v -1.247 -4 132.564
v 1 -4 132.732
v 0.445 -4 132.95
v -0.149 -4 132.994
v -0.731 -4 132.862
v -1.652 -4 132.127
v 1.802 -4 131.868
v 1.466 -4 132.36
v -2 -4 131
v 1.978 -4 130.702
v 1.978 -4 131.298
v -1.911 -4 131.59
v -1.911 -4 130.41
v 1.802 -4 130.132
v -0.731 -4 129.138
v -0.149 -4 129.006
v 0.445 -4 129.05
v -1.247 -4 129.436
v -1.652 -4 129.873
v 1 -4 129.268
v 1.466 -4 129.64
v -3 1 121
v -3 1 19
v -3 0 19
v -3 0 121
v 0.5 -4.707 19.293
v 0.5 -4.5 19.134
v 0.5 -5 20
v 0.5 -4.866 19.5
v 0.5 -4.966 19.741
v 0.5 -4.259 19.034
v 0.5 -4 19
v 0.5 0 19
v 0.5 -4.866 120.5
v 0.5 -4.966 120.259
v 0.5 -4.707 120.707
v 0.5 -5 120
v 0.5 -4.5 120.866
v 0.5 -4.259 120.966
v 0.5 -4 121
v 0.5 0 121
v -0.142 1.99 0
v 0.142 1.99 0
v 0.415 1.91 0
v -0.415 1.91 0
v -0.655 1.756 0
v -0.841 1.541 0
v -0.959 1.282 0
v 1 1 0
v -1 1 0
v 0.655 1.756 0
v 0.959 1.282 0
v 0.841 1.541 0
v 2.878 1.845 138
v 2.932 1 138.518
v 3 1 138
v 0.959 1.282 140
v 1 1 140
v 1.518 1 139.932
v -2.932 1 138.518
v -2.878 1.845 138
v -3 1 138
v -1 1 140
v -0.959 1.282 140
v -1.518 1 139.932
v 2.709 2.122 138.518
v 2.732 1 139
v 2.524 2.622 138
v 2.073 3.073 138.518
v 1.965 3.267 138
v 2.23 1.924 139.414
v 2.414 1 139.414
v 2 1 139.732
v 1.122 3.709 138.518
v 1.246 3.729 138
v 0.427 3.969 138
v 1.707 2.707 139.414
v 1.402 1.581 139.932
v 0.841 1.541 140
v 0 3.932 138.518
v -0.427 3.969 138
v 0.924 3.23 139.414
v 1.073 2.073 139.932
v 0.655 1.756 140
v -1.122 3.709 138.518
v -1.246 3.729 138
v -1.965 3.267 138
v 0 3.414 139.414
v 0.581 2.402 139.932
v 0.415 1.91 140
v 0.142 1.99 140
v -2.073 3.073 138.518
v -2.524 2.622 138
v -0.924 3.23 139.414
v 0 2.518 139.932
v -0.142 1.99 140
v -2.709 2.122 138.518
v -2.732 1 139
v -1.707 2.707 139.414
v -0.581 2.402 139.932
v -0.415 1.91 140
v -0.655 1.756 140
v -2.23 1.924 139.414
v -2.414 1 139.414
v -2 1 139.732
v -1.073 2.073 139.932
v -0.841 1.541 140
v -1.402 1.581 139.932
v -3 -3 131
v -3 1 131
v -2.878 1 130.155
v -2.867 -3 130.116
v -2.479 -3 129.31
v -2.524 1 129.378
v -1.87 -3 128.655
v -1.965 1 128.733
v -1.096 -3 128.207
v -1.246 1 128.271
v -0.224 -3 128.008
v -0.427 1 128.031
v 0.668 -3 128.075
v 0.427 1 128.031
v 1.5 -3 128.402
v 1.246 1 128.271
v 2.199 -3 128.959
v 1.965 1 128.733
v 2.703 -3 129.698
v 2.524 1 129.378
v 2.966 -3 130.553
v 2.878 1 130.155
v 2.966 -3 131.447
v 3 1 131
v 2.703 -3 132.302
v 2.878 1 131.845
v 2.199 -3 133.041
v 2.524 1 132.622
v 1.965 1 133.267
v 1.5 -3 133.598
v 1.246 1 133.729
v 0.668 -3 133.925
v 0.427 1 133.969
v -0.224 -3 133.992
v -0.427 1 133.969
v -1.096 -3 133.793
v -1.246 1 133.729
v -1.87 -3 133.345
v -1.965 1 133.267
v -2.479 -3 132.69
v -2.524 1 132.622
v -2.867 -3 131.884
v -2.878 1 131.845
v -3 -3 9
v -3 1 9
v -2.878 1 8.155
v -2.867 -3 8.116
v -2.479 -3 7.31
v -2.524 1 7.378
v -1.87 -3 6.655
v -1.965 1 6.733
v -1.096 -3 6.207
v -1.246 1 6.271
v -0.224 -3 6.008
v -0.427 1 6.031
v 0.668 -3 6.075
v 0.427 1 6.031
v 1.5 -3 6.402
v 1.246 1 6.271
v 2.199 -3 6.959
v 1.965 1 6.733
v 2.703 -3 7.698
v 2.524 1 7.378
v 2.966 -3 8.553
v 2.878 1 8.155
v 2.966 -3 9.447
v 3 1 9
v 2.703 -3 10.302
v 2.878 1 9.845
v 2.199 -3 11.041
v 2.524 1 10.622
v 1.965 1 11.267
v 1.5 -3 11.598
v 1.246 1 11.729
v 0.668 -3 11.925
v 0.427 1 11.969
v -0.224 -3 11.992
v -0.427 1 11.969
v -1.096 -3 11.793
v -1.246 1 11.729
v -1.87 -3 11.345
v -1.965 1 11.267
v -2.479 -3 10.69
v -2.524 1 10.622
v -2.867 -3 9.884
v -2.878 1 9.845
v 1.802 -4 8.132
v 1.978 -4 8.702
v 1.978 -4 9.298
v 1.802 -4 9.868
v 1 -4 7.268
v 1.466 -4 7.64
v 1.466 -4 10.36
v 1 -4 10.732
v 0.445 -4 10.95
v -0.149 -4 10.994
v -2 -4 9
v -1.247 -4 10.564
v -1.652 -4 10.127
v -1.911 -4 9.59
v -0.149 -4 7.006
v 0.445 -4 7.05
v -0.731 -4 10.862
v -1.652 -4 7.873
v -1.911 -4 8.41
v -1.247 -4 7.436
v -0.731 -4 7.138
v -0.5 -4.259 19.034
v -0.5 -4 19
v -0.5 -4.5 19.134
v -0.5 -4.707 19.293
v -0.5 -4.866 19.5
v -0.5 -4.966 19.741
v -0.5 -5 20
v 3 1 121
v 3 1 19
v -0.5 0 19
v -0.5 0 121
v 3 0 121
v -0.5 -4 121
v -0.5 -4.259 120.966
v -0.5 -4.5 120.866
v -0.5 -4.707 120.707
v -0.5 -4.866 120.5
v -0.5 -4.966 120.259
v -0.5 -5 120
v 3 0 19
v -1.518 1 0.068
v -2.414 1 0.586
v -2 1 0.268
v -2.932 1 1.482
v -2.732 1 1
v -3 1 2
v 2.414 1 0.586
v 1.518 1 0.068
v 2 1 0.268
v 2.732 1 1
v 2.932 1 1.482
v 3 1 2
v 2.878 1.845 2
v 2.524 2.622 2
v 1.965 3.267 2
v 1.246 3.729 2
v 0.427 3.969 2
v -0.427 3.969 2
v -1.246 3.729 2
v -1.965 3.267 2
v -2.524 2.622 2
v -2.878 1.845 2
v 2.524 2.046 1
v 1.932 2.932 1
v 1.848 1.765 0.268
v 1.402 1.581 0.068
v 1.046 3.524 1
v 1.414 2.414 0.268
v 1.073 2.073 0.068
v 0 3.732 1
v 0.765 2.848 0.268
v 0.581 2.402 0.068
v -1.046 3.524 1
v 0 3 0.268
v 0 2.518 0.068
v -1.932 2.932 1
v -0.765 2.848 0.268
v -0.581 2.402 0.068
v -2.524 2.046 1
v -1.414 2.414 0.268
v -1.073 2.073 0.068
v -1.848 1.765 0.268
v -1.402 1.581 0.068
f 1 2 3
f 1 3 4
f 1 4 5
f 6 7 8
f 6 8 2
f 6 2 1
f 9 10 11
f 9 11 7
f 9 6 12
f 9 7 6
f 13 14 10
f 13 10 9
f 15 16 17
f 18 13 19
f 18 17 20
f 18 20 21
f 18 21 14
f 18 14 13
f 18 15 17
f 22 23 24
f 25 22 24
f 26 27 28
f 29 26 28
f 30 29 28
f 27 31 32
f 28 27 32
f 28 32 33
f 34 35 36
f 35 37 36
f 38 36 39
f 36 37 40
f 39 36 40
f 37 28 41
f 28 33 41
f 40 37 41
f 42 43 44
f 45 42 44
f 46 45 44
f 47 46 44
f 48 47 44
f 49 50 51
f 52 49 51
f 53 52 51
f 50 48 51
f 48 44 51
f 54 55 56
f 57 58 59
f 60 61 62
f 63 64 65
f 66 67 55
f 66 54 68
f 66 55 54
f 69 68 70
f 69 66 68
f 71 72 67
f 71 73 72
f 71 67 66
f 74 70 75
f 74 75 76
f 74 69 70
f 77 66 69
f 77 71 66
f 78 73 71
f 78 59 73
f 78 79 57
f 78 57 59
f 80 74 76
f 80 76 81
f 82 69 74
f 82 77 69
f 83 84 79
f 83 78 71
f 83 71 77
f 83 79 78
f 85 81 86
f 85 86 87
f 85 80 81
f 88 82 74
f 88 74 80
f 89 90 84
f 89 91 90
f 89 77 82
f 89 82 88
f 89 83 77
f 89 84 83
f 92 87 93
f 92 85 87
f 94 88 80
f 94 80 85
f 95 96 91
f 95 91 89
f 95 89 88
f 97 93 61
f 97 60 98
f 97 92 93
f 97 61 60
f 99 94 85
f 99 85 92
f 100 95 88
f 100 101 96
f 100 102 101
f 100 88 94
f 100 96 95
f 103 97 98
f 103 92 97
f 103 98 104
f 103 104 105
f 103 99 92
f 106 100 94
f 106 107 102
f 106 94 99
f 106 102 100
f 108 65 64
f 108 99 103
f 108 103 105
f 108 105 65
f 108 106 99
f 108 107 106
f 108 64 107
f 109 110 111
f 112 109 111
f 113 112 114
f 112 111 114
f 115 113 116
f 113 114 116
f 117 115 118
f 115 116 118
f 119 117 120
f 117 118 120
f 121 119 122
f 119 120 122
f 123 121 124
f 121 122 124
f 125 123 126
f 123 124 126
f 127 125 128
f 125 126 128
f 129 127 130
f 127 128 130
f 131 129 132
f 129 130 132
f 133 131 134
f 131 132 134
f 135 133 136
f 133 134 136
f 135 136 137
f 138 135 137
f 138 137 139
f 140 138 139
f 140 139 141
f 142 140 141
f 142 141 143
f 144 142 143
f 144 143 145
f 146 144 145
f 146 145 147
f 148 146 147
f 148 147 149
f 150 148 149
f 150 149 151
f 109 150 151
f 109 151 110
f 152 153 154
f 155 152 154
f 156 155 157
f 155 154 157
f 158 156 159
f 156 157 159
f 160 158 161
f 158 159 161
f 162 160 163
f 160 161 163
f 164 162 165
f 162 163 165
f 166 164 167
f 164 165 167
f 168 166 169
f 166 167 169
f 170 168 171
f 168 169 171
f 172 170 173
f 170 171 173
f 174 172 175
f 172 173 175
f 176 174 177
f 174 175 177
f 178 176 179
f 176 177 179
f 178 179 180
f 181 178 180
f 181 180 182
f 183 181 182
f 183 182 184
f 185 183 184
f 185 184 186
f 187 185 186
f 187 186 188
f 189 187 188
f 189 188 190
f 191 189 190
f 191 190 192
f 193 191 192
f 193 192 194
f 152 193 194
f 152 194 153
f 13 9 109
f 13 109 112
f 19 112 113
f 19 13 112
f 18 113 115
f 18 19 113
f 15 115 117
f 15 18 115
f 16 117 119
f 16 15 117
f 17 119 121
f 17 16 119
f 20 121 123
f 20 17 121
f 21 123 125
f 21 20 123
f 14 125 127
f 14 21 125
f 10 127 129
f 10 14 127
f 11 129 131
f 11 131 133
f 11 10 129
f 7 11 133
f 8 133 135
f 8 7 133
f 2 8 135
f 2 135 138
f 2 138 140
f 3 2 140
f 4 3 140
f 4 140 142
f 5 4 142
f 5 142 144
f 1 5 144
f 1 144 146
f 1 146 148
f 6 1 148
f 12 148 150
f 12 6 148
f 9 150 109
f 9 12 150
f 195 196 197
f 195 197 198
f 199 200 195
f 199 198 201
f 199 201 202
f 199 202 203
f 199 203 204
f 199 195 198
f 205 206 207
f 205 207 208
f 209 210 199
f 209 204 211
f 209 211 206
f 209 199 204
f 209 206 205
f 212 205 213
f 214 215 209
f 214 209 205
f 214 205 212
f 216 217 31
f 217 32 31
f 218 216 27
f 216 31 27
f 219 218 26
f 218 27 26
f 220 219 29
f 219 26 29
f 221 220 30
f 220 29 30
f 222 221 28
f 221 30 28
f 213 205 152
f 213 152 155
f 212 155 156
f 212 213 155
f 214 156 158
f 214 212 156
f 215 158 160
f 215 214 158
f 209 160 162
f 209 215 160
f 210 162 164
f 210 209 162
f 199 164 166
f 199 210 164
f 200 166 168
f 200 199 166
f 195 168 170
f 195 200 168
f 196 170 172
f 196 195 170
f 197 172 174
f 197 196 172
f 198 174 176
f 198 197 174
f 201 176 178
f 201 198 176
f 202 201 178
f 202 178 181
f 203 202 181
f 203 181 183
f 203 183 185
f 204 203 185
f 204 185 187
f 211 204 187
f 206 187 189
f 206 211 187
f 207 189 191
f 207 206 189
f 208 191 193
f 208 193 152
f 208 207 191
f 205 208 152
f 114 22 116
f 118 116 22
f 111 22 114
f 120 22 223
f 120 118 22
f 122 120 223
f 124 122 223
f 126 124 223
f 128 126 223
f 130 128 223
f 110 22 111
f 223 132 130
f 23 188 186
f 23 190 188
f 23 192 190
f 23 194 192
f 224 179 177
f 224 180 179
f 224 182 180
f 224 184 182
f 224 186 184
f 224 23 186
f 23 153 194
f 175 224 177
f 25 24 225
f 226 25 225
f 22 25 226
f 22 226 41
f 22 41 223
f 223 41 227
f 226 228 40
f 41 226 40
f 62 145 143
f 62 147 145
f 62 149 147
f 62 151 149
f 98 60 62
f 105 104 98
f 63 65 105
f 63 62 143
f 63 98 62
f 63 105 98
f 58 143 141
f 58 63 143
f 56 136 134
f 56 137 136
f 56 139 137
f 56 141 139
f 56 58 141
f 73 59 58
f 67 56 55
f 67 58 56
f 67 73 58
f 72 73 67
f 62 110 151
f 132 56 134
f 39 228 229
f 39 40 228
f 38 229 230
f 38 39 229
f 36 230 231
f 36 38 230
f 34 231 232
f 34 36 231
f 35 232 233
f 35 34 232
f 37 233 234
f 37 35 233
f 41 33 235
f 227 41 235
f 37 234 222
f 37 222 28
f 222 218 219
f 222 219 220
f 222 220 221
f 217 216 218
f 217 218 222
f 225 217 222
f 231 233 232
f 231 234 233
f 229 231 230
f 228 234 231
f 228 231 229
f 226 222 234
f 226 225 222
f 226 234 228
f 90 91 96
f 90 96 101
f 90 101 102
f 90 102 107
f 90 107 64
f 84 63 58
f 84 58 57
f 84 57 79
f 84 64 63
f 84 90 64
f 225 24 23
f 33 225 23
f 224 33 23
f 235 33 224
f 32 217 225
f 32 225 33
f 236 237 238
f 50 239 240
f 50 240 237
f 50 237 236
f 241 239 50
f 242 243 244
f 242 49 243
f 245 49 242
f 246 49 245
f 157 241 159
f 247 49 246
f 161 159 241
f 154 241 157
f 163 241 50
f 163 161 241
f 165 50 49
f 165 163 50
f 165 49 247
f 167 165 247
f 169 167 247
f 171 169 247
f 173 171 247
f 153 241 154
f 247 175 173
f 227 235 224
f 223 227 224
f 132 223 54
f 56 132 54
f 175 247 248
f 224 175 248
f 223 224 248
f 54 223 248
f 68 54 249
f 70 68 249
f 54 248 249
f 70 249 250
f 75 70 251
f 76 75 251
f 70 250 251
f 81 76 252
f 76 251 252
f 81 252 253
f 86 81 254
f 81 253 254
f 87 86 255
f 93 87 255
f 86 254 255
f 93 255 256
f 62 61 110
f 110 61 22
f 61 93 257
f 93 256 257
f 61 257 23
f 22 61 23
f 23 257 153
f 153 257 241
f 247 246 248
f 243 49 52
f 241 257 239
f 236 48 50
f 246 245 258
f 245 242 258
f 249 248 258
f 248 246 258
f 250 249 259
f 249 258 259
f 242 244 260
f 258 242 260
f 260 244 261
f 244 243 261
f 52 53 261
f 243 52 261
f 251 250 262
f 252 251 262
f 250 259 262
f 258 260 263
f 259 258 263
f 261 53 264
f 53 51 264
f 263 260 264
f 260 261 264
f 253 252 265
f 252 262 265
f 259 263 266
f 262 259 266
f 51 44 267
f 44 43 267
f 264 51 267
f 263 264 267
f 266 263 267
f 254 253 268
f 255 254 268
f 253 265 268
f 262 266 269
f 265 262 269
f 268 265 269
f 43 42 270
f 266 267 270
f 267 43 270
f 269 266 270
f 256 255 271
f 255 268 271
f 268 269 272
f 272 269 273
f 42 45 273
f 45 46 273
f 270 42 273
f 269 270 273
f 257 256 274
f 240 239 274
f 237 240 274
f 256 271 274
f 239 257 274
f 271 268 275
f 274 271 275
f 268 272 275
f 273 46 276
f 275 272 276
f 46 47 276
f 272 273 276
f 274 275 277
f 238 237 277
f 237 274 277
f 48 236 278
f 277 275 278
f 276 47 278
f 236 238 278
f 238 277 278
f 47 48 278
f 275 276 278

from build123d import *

# Parameters (mm, degrees)
EXTRUDE_2_DEPTH     = 140
SKETCH_4_W          = 6
SKETCH_4_H          = 19
CUT_EXTRUDE_1_DEPTH = 1
SKETCH_3_R          = 3
EXTRUDE_4_DEPTH     = 5
CHAMFER_2_SIZE      = 1
FILLET_2_R          = 2
SKETCH_5_W          = 1
SKETCH_5_H          = 102
EXTRUDE_5_DEPTH     = 5
FILLET_3_R          = 1


with BuildPart() as part:
    # 草图2 → 凸台-拉伸2 (new body)
    with BuildSketch(Plane.XY):
        with BuildLine():
            Line((-3, 0), (3, 0))
            Line((3, 0), (3, 1))
            ThreePointArc((3, 1), (0, 4), (-3, 1))
            Line((-3, 1), (-3, 0))
        make_face()
    extrude(amount=EXTRUDE_2_DEPTH)

    # 草图4 → 切除-拉伸1 (cut)
    with BuildSketch(Plane.XZ):
        with Locations((0, 130.5)):
            Rectangle(SKETCH_4_W, SKETCH_4_H)
        with Locations((0, 9.5)):
            Rectangle(SKETCH_4_W, SKETCH_4_H)
    extrude(amount=-CUT_EXTRUDE_1_DEPTH, mode=Mode.SUBTRACT)

    # 草图3 → 凸台-拉伸4 (add)
    with BuildSketch(Plane.XZ.offset(-1)):
        with Locations(Location((0, 131, 0), (0, 0, 180))):
            Circle(SKETCH_3_R)
        with Locations(Location((0, 9, 0), (0, 0, 180))):
            Circle(SKETCH_3_R)
    extrude(amount=EXTRUDE_4_DEPTH)

    # 倒角2
    chamfer_2_edges = [part.edges().sort_by_distance(p)[0] for p in [
        (3, -4, 131),
        (3, -4, 9),
    ]]
    chamfer(chamfer_2_edges, length=CHAMFER_2_SIZE)

    # 圆角2
    fillet_2_edges = [part.edges().sort_by_distance(p)[0] for p in [
        (0, 4, 140),
        (0, 4, 0),
    ]]
    fillet(fillet_2_edges, radius=FILLET_2_R)

    # 草图5 → 凸台-拉伸5 (add)
    with BuildSketch(Plane.XZ):
        with Locations((0, 70)):
            Rectangle(SKETCH_5_W, SKETCH_5_H)
    extrude(amount=EXTRUDE_5_DEPTH)

    # 圆角3
    fillet_3_edges = [part.edges().sort_by_distance(p)[0] for p in [
        (0, -5, 19),
        (0, -5, 121),
    ]]
    fillet(fillet_3_edges, radius=FILLET_3_R)


solid = part.part
